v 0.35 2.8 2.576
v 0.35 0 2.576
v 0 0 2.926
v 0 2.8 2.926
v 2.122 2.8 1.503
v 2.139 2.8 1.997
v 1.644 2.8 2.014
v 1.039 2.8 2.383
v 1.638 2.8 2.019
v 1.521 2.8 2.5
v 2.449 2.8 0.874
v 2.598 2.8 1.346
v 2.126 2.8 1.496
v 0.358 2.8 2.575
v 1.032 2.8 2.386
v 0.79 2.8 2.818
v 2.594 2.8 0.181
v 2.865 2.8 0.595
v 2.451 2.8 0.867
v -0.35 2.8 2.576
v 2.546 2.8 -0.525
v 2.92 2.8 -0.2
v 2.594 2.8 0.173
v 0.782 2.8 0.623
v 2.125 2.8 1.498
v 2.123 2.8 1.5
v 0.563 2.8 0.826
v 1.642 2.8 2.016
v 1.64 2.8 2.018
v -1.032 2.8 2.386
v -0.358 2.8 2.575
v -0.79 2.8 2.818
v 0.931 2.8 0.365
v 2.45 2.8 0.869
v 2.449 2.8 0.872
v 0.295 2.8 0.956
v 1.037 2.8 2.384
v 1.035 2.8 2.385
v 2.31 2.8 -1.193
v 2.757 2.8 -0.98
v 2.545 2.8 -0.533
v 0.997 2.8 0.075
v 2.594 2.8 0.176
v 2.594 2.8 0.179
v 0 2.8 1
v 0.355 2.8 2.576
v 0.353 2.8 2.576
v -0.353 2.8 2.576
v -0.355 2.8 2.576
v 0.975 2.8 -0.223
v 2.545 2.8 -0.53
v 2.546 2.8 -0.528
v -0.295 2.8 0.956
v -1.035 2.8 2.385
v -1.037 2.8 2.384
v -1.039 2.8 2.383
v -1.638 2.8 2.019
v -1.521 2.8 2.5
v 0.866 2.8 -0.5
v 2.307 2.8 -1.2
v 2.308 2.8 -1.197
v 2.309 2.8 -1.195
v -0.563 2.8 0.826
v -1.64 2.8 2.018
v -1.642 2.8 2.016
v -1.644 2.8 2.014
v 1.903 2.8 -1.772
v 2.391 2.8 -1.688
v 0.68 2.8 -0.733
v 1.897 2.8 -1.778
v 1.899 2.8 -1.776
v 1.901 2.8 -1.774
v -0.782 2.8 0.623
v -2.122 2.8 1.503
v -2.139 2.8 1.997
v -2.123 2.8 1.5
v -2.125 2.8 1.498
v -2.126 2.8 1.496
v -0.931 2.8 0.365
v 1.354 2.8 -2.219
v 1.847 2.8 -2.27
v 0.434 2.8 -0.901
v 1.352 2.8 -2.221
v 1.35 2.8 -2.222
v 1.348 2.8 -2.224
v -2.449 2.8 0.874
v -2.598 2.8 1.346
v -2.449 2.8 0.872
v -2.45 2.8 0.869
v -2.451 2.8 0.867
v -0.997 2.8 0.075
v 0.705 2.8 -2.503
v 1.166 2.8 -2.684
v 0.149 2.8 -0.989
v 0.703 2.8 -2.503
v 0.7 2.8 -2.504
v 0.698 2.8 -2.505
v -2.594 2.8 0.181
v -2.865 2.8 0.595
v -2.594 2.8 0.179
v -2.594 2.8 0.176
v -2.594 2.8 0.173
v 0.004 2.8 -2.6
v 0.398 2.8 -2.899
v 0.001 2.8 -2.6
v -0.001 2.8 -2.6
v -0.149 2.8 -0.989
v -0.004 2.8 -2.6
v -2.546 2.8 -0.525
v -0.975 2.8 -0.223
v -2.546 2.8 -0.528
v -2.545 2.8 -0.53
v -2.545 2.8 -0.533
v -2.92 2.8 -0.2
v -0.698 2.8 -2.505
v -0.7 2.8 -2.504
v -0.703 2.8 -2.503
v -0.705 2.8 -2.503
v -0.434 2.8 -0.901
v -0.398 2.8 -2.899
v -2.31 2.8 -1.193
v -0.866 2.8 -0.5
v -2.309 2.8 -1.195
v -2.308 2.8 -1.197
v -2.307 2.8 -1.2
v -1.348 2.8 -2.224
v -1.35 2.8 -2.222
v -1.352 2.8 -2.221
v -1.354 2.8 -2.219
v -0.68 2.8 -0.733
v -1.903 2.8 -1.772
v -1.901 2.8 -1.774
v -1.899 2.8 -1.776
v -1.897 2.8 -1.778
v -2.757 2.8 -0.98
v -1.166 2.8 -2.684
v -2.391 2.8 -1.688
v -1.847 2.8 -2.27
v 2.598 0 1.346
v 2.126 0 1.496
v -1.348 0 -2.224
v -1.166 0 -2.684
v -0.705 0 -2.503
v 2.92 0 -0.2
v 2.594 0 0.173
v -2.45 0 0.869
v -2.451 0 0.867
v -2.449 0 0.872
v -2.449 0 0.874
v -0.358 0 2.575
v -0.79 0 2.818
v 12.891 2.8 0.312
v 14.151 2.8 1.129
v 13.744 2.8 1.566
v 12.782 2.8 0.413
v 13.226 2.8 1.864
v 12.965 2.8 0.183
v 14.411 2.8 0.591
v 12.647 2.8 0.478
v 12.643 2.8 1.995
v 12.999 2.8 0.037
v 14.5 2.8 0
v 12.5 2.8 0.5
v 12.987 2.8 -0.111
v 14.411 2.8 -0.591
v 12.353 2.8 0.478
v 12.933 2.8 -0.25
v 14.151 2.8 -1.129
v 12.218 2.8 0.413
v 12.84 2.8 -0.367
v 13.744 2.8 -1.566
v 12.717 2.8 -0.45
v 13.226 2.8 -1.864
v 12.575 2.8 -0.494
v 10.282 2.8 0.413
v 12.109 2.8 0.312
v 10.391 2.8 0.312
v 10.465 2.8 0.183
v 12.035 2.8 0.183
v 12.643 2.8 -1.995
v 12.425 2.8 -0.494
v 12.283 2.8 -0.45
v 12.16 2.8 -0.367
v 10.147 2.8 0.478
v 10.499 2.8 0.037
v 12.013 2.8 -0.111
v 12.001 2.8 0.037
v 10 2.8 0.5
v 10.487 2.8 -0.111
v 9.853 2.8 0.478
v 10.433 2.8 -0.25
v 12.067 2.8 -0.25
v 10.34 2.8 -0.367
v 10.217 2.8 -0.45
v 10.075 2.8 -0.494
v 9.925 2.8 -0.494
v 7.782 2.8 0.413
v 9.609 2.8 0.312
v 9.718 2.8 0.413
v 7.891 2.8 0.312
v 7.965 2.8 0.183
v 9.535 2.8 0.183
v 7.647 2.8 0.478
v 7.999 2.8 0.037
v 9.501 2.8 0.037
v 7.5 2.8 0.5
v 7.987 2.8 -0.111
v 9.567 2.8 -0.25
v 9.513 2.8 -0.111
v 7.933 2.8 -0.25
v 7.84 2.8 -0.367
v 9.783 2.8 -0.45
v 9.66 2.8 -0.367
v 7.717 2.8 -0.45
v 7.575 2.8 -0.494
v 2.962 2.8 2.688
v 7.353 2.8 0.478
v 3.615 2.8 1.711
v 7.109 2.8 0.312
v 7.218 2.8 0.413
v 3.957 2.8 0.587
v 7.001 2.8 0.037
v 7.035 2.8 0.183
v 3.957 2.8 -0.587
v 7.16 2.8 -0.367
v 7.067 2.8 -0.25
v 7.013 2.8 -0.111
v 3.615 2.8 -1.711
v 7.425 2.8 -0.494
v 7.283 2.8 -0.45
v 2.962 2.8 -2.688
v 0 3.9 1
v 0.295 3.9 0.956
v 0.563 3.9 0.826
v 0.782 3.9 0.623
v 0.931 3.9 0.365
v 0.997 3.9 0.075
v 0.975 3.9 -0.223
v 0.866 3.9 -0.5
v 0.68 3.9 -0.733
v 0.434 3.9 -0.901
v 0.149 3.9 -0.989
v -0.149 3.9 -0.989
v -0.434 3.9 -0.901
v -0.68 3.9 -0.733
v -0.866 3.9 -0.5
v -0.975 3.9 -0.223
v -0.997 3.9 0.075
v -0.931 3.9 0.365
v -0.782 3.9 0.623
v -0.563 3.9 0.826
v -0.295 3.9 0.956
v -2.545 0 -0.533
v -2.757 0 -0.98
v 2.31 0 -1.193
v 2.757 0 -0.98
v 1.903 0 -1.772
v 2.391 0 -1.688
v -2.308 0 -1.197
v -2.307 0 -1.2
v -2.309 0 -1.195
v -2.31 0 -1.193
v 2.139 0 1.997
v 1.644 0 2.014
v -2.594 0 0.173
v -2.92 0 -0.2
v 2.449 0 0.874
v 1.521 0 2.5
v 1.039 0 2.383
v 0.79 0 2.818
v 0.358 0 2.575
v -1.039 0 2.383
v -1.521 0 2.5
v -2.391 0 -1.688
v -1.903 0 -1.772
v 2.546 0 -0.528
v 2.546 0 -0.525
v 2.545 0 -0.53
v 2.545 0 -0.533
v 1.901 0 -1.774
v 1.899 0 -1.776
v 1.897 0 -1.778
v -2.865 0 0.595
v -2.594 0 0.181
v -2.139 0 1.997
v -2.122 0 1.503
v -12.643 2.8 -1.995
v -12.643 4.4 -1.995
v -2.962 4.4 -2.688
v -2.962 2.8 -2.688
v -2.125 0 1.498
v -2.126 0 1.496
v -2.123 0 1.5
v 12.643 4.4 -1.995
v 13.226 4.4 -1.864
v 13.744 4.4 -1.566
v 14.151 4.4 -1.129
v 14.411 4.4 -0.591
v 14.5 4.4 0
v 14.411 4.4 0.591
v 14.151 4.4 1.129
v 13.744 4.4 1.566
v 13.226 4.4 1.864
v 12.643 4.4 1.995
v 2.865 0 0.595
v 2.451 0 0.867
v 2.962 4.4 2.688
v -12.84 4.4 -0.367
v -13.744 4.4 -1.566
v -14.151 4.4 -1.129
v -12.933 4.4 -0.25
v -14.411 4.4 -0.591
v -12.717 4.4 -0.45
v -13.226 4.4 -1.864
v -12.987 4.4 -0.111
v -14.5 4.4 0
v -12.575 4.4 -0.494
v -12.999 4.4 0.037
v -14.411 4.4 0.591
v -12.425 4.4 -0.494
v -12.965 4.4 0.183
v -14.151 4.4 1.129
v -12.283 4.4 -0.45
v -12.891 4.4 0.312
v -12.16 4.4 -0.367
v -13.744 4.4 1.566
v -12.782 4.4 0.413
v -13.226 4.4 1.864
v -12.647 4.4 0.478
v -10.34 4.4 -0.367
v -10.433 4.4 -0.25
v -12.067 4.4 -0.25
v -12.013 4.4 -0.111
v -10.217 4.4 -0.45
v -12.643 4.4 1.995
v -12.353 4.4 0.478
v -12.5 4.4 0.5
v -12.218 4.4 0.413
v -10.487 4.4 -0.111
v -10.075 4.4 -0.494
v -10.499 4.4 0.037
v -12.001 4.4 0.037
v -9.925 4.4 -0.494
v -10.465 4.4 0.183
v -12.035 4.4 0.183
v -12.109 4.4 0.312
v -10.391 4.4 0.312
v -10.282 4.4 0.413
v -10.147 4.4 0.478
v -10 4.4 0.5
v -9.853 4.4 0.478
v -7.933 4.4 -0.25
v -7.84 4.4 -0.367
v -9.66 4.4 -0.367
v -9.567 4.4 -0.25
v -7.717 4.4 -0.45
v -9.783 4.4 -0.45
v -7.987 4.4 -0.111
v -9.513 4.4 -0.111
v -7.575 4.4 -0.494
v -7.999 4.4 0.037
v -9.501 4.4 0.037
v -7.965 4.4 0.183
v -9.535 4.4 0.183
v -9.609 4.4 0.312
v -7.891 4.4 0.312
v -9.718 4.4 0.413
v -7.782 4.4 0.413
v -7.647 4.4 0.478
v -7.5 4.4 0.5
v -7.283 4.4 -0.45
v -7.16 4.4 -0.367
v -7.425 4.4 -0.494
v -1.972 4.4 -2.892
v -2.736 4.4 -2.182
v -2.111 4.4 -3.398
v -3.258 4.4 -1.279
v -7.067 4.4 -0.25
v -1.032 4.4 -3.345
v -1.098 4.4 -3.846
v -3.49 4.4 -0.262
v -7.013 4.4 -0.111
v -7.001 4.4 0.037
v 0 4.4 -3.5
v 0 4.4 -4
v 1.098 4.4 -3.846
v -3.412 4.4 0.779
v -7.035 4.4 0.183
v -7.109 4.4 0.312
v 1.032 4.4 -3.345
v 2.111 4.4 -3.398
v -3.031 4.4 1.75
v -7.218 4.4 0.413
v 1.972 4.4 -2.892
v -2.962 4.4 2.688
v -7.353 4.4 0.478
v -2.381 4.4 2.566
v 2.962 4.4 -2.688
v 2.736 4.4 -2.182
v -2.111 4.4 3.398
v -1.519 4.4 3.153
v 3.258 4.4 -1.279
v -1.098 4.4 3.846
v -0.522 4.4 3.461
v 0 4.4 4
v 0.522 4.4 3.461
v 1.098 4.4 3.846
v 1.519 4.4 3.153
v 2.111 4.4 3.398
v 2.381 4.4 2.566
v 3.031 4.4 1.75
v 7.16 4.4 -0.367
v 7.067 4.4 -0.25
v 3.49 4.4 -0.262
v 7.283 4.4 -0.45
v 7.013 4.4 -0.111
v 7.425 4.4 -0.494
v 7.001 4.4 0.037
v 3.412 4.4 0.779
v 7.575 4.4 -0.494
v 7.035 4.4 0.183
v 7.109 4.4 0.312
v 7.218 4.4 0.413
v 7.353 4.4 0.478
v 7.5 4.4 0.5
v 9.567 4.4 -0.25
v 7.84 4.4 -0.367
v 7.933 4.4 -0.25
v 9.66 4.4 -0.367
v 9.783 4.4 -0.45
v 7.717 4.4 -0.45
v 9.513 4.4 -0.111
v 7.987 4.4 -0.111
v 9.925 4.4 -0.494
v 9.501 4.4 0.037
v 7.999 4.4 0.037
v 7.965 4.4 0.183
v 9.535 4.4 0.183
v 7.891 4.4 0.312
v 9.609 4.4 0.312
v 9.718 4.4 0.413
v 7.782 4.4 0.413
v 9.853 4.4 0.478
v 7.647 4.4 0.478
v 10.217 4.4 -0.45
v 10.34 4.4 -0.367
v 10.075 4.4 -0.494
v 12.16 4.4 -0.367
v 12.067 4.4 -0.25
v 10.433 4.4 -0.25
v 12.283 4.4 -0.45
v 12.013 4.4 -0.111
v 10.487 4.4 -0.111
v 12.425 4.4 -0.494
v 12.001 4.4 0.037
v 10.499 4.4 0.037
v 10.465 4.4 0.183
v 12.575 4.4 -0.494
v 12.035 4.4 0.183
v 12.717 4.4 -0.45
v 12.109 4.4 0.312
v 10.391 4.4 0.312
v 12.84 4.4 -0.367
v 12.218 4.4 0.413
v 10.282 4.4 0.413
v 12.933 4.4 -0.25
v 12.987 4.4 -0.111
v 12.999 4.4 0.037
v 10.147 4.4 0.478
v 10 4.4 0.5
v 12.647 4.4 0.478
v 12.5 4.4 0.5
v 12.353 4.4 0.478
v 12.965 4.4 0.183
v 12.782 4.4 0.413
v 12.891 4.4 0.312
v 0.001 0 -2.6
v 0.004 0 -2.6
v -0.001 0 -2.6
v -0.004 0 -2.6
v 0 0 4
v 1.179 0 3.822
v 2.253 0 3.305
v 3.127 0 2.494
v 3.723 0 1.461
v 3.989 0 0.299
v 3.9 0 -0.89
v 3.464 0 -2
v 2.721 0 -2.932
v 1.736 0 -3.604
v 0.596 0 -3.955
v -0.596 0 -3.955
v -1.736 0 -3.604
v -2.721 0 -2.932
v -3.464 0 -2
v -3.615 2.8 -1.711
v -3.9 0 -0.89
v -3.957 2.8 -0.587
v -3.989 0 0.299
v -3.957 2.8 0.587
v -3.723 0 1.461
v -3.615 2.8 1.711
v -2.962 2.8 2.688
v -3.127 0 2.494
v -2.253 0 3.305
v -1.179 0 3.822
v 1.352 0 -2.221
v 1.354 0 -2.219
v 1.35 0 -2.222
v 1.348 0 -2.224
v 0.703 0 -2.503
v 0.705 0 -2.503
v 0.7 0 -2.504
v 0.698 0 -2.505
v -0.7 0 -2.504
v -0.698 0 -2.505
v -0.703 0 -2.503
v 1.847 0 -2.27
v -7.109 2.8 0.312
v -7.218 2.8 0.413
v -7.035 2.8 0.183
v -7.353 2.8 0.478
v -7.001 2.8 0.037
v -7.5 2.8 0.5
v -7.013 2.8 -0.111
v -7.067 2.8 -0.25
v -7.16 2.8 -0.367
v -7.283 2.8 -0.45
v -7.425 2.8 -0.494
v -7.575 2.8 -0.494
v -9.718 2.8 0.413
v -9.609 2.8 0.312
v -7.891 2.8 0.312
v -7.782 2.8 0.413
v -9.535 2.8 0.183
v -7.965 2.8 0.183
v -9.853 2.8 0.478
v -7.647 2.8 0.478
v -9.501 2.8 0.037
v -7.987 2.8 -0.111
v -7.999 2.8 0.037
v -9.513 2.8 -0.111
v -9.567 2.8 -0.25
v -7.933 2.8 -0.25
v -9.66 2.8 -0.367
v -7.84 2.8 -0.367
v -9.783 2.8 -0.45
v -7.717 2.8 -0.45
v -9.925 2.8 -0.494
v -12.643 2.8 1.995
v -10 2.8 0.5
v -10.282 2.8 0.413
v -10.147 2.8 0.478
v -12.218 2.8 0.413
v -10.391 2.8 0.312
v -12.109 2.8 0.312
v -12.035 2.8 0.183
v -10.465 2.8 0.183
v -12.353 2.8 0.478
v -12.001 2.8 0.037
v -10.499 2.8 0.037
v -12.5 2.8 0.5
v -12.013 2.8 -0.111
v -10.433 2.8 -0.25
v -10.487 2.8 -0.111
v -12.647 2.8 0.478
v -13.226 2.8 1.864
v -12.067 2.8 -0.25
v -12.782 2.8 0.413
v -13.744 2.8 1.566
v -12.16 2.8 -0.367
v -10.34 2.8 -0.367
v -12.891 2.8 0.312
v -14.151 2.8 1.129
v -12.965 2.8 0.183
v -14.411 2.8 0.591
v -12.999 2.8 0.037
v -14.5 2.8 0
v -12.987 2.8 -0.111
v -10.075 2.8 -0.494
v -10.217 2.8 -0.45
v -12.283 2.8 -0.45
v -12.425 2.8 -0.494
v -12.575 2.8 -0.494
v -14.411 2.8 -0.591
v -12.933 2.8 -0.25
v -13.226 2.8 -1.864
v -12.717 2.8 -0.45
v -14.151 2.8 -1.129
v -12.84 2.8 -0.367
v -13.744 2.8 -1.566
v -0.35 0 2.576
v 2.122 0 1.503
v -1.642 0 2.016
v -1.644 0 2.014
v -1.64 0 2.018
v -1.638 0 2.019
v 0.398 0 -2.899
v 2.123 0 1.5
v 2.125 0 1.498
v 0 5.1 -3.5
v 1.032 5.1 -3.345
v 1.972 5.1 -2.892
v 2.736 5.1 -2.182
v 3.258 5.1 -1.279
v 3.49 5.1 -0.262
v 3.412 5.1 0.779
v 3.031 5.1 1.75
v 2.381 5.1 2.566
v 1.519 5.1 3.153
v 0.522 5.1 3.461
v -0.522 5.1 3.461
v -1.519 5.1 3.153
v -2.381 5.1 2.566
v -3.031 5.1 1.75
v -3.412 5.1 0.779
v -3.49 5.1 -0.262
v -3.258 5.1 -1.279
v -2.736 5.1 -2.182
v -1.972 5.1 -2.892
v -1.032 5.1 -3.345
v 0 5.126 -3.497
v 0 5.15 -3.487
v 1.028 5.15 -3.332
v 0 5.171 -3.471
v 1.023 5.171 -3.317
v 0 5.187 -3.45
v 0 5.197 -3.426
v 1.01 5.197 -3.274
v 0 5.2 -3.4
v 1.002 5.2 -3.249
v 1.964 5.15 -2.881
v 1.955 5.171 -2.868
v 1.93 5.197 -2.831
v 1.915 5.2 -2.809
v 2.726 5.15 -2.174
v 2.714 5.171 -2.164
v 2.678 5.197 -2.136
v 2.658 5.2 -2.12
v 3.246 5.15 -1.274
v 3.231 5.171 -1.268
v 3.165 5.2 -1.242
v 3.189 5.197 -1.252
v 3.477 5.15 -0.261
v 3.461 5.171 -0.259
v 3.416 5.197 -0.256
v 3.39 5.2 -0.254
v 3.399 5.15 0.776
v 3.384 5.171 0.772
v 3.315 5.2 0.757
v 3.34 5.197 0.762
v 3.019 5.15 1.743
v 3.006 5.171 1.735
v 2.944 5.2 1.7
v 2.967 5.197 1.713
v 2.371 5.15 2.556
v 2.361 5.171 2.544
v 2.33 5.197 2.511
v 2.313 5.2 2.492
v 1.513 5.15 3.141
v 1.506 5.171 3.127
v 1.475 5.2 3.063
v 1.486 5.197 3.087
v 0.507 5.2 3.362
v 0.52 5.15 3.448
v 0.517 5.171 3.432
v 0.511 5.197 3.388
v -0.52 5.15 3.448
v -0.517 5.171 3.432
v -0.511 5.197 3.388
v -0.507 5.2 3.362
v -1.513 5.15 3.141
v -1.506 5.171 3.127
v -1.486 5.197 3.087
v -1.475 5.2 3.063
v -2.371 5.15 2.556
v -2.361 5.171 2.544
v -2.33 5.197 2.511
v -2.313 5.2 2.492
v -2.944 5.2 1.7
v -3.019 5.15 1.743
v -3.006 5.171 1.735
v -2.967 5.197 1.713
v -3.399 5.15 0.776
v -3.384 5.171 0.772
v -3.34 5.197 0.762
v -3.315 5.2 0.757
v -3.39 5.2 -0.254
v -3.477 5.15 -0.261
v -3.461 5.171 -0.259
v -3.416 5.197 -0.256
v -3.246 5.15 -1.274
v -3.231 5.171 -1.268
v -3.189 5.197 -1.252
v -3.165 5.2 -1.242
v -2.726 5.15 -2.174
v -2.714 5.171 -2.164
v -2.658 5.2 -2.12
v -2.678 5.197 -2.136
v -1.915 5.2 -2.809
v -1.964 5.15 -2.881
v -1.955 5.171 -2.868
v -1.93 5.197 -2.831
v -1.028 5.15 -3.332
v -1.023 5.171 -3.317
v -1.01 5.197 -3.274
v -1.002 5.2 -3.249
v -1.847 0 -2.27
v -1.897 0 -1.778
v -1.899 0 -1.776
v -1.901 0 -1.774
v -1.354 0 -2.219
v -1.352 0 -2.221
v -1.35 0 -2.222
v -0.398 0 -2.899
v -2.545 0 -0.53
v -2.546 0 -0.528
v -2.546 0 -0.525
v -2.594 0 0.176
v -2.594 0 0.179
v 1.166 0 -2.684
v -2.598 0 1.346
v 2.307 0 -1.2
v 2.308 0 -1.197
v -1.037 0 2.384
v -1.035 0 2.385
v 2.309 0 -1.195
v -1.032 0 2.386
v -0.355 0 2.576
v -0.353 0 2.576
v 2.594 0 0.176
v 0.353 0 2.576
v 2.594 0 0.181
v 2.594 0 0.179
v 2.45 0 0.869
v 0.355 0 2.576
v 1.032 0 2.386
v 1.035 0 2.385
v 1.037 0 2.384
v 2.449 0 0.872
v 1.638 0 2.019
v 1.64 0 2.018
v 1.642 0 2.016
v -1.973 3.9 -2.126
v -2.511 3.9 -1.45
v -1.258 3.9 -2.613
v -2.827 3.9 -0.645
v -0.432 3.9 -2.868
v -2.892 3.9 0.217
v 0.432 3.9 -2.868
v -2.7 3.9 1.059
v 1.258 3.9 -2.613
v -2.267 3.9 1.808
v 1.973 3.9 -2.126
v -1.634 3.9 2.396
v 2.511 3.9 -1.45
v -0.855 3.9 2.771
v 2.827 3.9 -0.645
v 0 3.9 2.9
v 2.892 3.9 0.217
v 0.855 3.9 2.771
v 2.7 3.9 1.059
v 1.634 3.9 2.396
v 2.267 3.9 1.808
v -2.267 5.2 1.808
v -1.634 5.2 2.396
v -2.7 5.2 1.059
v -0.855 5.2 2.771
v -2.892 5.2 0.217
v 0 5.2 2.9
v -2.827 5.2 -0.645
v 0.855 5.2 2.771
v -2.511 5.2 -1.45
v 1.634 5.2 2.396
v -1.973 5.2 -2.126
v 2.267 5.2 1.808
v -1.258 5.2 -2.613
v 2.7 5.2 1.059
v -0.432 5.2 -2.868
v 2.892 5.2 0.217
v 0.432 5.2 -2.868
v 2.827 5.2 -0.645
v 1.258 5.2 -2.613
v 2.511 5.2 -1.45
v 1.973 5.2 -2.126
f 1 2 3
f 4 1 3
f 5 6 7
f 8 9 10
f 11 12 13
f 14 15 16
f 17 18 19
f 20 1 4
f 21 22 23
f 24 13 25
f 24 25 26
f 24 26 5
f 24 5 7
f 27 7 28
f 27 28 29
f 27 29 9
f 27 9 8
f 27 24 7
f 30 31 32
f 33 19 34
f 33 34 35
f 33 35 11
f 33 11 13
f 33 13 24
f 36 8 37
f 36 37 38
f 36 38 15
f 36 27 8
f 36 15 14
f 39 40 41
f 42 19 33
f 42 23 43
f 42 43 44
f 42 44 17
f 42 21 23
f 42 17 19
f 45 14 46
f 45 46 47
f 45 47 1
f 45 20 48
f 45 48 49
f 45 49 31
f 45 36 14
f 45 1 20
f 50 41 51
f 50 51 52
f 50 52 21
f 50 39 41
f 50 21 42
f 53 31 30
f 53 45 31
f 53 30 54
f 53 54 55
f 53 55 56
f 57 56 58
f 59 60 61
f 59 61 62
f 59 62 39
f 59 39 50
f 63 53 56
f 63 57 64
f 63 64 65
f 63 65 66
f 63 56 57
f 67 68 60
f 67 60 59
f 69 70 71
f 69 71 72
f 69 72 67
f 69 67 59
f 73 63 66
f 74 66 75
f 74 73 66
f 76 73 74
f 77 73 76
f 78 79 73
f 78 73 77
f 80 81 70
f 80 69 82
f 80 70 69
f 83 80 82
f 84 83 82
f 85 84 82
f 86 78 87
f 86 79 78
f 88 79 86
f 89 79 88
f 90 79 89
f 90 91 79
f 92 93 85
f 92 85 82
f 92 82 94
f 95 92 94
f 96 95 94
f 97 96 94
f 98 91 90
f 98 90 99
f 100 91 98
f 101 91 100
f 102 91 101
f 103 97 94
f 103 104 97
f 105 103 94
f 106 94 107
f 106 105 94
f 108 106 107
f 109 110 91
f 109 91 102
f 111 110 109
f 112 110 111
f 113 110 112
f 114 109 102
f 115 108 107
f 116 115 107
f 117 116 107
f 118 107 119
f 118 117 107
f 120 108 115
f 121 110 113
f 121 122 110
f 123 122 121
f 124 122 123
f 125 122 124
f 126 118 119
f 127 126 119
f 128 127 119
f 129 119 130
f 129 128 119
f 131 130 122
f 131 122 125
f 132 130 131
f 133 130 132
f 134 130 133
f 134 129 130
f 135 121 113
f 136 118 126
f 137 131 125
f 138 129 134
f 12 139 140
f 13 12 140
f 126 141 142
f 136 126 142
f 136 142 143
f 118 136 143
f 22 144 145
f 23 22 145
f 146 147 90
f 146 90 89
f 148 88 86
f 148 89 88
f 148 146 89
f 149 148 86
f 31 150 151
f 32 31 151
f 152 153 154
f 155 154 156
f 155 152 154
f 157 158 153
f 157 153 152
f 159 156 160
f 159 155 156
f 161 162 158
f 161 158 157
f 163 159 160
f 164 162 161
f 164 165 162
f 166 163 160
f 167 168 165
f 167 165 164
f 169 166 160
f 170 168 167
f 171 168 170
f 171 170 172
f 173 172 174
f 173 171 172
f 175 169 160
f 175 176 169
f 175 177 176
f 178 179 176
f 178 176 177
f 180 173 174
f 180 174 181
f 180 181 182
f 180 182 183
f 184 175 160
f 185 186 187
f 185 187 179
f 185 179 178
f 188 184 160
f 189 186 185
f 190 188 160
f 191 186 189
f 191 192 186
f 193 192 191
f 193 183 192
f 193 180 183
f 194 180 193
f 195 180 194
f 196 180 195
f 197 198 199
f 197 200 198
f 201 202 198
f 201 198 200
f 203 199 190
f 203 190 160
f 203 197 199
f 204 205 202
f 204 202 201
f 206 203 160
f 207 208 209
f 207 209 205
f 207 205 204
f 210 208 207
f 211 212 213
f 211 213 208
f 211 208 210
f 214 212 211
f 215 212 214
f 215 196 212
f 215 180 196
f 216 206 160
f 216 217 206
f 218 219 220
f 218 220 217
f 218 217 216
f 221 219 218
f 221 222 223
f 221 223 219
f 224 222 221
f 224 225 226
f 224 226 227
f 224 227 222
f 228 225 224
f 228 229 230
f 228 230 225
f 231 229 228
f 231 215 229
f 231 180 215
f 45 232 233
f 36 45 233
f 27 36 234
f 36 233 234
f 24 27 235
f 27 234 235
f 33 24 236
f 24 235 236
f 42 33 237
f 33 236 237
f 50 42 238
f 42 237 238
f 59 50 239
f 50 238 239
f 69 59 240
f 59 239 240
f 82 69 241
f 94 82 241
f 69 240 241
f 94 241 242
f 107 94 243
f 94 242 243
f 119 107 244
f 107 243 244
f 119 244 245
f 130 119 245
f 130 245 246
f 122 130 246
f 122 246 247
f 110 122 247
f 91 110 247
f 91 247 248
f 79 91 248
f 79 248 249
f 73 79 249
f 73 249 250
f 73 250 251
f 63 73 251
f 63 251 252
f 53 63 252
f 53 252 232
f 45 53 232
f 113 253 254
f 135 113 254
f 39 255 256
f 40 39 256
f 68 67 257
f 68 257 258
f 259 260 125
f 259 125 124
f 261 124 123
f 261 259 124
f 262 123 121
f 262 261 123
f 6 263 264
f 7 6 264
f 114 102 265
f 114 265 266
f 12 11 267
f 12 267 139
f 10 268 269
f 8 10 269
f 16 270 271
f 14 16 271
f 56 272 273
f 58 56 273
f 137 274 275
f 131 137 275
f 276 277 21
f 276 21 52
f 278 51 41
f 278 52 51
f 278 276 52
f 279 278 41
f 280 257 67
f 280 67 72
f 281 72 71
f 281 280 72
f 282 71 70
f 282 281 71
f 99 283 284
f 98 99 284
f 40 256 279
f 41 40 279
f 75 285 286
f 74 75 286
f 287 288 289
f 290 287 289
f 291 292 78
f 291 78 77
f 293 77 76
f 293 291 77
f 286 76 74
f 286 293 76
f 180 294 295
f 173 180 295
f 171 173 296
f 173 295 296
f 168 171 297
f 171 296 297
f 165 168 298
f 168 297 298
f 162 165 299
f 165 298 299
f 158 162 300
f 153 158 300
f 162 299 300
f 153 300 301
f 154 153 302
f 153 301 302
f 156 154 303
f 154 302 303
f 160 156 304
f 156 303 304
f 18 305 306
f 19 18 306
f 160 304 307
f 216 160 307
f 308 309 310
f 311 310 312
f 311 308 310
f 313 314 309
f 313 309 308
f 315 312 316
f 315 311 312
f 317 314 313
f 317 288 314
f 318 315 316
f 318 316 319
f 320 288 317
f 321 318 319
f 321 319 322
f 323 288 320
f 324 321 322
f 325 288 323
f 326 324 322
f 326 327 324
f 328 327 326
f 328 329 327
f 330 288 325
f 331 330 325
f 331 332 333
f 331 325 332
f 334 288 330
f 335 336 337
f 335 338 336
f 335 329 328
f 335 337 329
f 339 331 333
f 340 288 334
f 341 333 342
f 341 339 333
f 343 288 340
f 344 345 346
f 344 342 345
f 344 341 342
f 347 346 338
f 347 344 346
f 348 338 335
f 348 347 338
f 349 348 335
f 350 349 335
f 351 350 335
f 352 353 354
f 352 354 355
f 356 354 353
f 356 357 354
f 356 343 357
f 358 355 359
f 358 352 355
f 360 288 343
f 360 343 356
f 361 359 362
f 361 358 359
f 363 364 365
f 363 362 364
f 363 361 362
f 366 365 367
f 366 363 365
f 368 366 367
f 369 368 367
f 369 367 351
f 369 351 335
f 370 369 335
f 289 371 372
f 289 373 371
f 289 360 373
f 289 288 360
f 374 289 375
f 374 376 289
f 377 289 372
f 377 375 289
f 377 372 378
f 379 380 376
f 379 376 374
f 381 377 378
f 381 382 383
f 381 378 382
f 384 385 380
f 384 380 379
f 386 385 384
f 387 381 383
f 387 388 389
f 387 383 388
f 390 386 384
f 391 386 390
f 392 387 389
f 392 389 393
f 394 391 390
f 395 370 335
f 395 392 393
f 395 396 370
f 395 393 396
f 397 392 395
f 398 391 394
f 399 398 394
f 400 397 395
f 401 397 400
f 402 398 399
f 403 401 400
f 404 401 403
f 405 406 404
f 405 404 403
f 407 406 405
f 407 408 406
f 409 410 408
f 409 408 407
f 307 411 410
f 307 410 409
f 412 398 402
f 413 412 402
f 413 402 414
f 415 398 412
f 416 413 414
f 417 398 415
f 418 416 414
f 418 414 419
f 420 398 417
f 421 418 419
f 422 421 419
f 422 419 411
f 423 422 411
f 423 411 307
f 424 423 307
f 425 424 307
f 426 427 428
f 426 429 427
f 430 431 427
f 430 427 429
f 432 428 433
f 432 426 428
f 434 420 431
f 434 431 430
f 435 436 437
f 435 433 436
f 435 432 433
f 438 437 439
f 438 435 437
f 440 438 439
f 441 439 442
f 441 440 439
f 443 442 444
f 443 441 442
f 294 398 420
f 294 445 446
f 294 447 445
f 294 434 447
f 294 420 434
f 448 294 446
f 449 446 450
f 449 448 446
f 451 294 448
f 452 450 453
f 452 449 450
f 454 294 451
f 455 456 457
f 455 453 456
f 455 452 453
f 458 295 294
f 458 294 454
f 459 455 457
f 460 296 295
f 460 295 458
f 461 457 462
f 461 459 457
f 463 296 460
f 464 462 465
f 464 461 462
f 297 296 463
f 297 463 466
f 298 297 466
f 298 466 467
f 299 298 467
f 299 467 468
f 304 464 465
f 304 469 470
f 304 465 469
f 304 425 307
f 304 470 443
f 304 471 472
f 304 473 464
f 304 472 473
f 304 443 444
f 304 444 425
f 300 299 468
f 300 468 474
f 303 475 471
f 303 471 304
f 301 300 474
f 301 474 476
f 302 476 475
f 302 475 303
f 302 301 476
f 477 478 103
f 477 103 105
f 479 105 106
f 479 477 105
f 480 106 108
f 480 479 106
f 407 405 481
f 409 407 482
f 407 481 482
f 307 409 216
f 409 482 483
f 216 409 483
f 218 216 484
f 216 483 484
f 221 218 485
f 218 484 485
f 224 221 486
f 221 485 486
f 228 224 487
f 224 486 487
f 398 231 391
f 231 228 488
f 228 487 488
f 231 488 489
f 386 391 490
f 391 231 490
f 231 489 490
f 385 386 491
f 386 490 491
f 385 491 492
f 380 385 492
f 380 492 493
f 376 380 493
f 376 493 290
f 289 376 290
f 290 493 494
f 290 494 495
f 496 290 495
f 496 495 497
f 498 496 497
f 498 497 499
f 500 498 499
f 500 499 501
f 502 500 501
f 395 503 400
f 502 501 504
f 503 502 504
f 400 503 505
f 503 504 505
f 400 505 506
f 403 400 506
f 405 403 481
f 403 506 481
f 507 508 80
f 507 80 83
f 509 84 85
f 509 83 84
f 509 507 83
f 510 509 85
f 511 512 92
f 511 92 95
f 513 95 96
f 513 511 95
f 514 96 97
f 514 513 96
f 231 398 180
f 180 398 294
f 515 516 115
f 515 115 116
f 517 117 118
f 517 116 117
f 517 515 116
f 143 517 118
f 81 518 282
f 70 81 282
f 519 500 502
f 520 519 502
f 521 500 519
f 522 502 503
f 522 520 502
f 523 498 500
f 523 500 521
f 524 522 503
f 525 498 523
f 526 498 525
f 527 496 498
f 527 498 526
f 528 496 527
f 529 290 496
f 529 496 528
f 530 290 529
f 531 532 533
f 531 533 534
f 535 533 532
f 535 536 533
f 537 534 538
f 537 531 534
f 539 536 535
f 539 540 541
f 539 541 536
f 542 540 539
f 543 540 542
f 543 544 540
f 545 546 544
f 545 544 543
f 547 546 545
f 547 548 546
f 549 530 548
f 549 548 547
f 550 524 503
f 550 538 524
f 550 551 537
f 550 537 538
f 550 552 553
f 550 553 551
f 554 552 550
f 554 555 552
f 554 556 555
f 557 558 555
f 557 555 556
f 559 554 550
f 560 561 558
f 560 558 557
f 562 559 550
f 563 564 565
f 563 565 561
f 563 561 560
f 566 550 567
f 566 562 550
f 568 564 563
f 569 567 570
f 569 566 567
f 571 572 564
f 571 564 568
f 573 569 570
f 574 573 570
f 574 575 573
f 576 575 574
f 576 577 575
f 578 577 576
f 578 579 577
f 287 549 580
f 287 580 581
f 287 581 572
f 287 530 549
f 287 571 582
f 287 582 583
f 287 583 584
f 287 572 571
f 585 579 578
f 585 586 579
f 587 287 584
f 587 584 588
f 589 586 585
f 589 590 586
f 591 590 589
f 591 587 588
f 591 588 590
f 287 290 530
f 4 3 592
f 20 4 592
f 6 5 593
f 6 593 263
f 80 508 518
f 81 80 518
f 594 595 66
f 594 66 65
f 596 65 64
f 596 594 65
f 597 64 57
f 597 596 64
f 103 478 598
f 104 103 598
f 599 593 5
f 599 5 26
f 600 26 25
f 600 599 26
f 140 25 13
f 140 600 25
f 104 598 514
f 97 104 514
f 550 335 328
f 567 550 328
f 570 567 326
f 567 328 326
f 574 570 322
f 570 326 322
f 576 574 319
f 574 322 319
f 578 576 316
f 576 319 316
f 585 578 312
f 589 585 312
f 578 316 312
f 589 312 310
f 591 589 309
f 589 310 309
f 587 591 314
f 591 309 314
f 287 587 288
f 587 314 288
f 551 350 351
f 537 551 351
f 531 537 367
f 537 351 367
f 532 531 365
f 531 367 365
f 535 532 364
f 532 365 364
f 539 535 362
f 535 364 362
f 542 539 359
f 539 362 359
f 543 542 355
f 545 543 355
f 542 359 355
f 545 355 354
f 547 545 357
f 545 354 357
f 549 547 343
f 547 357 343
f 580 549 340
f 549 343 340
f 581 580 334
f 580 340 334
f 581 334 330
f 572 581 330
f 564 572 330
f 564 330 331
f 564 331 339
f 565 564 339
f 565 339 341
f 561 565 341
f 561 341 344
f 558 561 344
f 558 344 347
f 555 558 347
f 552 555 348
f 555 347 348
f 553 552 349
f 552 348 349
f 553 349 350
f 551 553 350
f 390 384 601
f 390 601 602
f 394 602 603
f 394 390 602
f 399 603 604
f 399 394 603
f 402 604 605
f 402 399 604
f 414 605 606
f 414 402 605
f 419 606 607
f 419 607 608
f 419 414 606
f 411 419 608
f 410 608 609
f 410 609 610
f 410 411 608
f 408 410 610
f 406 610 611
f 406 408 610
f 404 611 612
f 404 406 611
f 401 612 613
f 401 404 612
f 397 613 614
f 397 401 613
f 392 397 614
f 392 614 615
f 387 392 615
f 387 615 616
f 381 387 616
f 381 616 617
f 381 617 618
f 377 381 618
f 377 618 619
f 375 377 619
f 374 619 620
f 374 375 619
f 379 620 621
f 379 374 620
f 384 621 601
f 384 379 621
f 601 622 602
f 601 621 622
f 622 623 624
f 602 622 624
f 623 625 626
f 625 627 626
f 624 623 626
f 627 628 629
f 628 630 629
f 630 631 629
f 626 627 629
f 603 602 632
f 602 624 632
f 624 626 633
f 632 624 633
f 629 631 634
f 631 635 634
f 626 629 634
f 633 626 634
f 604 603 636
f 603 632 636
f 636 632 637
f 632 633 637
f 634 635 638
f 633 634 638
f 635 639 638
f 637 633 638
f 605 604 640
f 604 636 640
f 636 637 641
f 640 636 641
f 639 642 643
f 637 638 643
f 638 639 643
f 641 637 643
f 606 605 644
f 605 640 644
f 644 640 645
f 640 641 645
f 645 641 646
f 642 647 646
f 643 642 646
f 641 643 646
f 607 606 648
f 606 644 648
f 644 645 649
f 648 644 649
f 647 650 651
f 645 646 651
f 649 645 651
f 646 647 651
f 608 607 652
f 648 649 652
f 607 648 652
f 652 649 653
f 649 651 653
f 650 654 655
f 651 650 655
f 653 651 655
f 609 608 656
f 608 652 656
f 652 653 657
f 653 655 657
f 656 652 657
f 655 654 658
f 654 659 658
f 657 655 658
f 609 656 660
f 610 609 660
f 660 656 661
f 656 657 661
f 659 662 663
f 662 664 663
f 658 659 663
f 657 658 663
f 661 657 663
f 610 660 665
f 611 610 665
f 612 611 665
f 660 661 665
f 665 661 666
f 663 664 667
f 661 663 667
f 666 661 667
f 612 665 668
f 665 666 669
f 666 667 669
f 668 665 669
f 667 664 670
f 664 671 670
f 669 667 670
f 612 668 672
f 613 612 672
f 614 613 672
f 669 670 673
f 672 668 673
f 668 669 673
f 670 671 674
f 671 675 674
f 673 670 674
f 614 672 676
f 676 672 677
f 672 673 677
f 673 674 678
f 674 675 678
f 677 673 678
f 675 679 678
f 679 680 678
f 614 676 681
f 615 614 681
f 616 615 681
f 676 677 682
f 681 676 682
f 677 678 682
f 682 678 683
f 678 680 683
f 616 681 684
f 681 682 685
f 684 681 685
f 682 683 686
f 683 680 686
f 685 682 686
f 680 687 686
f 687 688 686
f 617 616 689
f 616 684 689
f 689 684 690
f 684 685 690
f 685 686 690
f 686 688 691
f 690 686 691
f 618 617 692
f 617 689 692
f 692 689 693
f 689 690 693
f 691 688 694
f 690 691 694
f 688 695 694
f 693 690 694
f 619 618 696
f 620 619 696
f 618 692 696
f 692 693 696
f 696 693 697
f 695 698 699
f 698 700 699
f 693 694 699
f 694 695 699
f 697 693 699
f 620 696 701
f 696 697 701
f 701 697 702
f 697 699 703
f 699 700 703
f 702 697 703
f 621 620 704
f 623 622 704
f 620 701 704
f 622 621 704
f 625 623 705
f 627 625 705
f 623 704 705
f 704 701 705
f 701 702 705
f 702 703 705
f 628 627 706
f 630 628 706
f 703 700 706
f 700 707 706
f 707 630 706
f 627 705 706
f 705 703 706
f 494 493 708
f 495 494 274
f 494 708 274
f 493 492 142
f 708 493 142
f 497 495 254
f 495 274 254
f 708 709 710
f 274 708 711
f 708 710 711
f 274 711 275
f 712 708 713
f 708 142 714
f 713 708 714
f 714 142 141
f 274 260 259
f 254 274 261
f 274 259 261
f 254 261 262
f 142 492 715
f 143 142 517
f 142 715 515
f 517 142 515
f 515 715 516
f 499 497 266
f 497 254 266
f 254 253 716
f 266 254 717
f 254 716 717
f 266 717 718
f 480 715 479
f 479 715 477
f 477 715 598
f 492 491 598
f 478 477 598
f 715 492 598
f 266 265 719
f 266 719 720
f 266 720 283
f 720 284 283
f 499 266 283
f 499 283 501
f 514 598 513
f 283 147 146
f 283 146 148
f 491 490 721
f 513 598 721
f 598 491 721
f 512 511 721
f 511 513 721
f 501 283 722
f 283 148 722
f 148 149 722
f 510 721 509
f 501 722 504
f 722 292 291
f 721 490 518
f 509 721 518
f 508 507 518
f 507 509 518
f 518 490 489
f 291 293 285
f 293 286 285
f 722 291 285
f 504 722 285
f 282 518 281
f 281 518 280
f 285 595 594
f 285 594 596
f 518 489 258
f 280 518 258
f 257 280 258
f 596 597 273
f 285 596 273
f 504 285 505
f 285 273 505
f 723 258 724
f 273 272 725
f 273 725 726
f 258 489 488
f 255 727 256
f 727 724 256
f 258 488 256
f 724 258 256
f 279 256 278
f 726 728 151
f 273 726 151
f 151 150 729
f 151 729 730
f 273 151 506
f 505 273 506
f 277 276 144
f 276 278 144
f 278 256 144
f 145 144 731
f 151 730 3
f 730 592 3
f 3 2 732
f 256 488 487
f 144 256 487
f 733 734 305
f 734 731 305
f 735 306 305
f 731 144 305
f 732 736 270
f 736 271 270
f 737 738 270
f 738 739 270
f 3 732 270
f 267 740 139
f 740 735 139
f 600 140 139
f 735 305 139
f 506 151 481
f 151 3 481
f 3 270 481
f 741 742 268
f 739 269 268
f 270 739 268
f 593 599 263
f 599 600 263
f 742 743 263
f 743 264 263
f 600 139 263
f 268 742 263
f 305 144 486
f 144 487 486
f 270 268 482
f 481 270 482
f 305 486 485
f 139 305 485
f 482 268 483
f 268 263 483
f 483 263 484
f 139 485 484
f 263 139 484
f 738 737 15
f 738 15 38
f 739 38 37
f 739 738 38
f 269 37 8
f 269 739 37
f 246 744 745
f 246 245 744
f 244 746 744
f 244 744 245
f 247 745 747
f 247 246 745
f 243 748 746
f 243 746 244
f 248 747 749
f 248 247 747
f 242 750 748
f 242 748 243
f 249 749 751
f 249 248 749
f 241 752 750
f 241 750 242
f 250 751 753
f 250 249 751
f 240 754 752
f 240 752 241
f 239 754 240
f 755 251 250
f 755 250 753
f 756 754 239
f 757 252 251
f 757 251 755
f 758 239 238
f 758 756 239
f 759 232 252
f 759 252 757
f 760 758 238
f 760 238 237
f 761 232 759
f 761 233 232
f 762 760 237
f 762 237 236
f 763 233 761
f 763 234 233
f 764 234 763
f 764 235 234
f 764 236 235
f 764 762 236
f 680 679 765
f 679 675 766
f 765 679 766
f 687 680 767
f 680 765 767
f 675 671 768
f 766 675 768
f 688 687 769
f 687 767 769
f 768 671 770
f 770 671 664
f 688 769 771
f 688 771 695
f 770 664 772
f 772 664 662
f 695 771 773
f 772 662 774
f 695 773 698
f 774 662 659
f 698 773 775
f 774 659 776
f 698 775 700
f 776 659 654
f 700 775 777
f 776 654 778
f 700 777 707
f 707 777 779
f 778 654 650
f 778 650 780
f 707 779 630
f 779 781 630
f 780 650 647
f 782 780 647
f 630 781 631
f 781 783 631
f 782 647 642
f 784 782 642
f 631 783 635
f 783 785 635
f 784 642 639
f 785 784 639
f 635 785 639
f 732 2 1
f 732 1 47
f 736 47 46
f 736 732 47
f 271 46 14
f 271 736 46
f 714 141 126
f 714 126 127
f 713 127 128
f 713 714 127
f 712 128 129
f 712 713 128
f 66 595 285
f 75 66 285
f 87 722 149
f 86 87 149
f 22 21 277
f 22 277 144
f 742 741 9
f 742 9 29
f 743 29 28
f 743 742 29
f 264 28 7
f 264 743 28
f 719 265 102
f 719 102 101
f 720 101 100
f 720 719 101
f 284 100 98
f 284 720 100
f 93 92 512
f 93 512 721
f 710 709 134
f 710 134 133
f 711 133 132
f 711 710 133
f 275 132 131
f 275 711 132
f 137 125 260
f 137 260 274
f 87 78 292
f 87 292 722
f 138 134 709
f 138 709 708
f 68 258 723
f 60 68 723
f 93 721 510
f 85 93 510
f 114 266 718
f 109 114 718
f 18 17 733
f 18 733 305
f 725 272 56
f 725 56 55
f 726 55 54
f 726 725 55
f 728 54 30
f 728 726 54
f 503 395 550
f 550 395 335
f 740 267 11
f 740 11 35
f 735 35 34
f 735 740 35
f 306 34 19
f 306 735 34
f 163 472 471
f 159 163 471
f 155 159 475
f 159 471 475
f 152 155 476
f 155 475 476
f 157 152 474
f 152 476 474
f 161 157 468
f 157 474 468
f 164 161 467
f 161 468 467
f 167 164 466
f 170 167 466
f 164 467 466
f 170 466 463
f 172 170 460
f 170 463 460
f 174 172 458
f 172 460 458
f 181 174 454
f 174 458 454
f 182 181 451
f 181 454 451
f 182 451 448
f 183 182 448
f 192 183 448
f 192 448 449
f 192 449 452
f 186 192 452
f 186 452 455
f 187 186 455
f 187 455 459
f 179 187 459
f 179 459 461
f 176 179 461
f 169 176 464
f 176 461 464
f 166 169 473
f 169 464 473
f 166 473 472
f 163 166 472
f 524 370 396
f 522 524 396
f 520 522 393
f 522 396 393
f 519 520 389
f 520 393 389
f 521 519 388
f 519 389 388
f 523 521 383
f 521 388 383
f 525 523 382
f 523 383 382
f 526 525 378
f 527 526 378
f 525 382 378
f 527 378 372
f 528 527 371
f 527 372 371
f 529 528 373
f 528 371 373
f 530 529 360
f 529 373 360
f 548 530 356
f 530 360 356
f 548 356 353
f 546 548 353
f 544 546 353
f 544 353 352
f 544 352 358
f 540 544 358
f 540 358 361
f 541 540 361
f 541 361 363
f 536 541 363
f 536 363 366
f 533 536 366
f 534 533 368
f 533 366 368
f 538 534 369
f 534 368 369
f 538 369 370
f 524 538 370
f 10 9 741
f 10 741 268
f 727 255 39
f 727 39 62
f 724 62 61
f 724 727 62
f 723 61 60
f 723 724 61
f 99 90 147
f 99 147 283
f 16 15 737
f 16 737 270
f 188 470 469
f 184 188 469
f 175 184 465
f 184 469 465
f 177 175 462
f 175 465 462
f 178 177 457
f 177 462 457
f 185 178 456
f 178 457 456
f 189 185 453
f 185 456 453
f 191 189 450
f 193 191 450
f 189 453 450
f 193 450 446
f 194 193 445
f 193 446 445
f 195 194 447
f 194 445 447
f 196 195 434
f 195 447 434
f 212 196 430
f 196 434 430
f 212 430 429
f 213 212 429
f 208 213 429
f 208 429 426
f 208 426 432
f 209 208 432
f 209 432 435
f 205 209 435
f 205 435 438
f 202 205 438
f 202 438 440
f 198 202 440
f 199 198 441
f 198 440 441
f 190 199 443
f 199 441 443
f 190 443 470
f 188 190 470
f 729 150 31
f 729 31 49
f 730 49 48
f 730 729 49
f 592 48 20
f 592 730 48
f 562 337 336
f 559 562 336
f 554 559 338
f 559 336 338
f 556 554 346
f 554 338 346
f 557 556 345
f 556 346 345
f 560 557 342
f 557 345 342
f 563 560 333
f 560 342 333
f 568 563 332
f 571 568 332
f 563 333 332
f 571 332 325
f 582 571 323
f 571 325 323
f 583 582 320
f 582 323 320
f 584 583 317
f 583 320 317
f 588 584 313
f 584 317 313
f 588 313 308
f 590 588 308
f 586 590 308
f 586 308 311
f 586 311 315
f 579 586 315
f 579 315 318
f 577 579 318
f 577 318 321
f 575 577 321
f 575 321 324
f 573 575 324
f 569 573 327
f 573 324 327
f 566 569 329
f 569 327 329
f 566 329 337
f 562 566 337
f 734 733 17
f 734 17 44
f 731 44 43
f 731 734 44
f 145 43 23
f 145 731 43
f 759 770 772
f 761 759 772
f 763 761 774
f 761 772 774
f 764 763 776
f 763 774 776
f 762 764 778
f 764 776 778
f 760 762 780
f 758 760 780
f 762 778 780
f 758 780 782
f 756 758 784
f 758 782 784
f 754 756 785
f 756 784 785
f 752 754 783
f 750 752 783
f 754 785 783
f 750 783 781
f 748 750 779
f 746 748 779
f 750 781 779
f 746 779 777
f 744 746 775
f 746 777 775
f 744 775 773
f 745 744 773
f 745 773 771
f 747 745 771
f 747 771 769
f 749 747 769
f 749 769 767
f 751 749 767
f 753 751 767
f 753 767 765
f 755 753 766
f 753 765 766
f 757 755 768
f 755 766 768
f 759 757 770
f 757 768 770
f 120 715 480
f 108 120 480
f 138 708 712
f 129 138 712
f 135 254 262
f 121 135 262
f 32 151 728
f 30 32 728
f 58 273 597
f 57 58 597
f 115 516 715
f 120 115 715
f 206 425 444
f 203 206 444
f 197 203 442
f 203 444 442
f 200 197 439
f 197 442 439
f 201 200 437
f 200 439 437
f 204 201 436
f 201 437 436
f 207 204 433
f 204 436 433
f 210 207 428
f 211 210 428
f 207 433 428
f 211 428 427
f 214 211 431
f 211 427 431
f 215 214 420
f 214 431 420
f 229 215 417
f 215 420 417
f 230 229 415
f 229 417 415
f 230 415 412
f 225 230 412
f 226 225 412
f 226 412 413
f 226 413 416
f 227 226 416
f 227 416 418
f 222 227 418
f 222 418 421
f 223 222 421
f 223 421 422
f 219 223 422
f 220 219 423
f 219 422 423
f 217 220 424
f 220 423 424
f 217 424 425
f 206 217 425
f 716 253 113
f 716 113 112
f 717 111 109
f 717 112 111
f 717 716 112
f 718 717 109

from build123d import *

# Parameters (mm, degrees)
SKETCH1_R           = 4
SKETCH1_R_2         = 2.6
BOSS_EXTRUDE1_DEPTH = 4.4
SKETCH2_R           = 0.5
SKETCH2_R_2         = 1
BOSS_EXTRUDE2_DEPTH = 1.6
SKETCH3_R           = 3.5
BOSS_EXTRUDE3_DEPTH = 0.8
SKETCH4_R           = 2.9
CUT_EXTRUDE1_DEPTH  = 1.3
FILLET1_R           = 0.1
CUT_EXTRUDE2_DEPTH  = 2.8
CIRPATTERN1_COUNT   = 23


with BuildPart() as part:
    # Sketch1 → Boss-Extrude1 (new body)
    with BuildSketch(Plane(origin=(0, 0, 0), x_dir=(1, 0, 0), z_dir=(0, 1, 0))):
        with Locations(Location((0, 0, 0), (0, 0, 270))):
            Circle(SKETCH1_R)
        with Locations(Location((0, 0, 0), (0, 0, 270))):
            Circle(SKETCH1_R_2, mode=Mode.SUBTRACT)
    extrude(amount=BOSS_EXTRUDE1_DEPTH)

    # Sketch2 → Boss-Extrude2 (add)
    with BuildSketch(Plane(origin=(0, 4.4, 0), x_dir=(1, 0, 0), z_dir=(0, 1, 0))):
        with BuildLine():
            Line((0, 2.9), (12.642815505, 1.994894416))
            ThreePointArc((12.642815505, 1.994894416), (14.5, 0), (12.642815505, -1.994894416))
            Line((12.642815505, -1.994894416), (0, -2.9))
            Line((0, -2.9), (-12.642815505, -1.994894416))
            ThreePointArc((-12.642815505, -1.994894416), (-14.5, 0), (-12.642815505, 1.994894416))
            Line((-12.642815505, 1.994894416), (0, 2.9))
        make_face()
        with Locations(Location((12.5, 0, 0), (0, 0, 270))):
            Circle(SKETCH2_R, mode=Mode.SUBTRACT)
        with Locations(Location((10, 0, 0), (0, 0, 270))):
            Circle(SKETCH2_R, mode=Mode.SUBTRACT)
        with Locations(Location((7.5, 0, 0), (0, 0, 270))):
            Circle(SKETCH2_R, mode=Mode.SUBTRACT)
        with Locations(Location((-7.5, 0, 0), (0, 0, 270))):
            Circle(SKETCH2_R, mode=Mode.SUBTRACT)
        with Locations(Location((-10, 0, 0), (0, 0, 270))):
            Circle(SKETCH2_R, mode=Mode.SUBTRACT)
        with Locations(Location((-12.5, 0, 0), (0, 0, 270))):
            Circle(SKETCH2_R, mode=Mode.SUBTRACT)
        with Locations(Location((0, 0, 0), (0, 0, 270))):
            Circle(SKETCH2_R_2, mode=Mode.SUBTRACT)
    extrude(amount=-BOSS_EXTRUDE2_DEPTH)

    # Sketch3 → Boss-Extrude3 (add)
    with BuildSketch(Plane(origin=(0, 4.4, 0), x_dir=(-1, 0, 0), z_dir=(0, -1, 0))):
        with Locations(Location((0, 0, 0), (0, 0, 90))):
            Circle(SKETCH3_R)
    extrude(amount=-BOSS_EXTRUDE3_DEPTH)

    # Sketch4 → Cut-Extrude1 (cut)
    with BuildSketch(Plane(origin=(0, 5.2, 0), x_dir=(1, 0, 0), z_dir=(0, 1, 0))):
        with Locations(Location((0, 0, 0), (0, 0, 270))):
            Circle(SKETCH4_R)
    extrude(amount=-CUT_EXTRUDE1_DEPTH, mode=Mode.SUBTRACT)

    # Fillet1
    fillet1_edges = [part.edges().sort_by_distance(p)[0] for p in [
        (0, 5.2, 3.5),
    ]]
    fillet(fillet1_edges, radius=FILLET1_R)

    # Sketch5 → Cut-Extrude2 (cut)
    with BuildSketch(Plane.XZ):
        Polygon((-0.466249863, 2.460177118), (0.466249863, 2.460177118), (0, 2.926426981), align=None)
    cut_extrude2 = extrude(amount=-CUT_EXTRUDE2_DEPTH, mode=Mode.SUBTRACT)

    # CirPattern1: Cut-Extrude2 ×23 about axis
    cirpattern1_axis = Axis((0, 0, 0), (0, 1, 0))
    for i in range(1, CIRPATTERN1_COUNT):
        add(cut_extrude2.rotate(cirpattern1_axis, i * 360 / CIRPATTERN1_COUNT), mode=Mode.SUBTRACT)


solid = part.part
